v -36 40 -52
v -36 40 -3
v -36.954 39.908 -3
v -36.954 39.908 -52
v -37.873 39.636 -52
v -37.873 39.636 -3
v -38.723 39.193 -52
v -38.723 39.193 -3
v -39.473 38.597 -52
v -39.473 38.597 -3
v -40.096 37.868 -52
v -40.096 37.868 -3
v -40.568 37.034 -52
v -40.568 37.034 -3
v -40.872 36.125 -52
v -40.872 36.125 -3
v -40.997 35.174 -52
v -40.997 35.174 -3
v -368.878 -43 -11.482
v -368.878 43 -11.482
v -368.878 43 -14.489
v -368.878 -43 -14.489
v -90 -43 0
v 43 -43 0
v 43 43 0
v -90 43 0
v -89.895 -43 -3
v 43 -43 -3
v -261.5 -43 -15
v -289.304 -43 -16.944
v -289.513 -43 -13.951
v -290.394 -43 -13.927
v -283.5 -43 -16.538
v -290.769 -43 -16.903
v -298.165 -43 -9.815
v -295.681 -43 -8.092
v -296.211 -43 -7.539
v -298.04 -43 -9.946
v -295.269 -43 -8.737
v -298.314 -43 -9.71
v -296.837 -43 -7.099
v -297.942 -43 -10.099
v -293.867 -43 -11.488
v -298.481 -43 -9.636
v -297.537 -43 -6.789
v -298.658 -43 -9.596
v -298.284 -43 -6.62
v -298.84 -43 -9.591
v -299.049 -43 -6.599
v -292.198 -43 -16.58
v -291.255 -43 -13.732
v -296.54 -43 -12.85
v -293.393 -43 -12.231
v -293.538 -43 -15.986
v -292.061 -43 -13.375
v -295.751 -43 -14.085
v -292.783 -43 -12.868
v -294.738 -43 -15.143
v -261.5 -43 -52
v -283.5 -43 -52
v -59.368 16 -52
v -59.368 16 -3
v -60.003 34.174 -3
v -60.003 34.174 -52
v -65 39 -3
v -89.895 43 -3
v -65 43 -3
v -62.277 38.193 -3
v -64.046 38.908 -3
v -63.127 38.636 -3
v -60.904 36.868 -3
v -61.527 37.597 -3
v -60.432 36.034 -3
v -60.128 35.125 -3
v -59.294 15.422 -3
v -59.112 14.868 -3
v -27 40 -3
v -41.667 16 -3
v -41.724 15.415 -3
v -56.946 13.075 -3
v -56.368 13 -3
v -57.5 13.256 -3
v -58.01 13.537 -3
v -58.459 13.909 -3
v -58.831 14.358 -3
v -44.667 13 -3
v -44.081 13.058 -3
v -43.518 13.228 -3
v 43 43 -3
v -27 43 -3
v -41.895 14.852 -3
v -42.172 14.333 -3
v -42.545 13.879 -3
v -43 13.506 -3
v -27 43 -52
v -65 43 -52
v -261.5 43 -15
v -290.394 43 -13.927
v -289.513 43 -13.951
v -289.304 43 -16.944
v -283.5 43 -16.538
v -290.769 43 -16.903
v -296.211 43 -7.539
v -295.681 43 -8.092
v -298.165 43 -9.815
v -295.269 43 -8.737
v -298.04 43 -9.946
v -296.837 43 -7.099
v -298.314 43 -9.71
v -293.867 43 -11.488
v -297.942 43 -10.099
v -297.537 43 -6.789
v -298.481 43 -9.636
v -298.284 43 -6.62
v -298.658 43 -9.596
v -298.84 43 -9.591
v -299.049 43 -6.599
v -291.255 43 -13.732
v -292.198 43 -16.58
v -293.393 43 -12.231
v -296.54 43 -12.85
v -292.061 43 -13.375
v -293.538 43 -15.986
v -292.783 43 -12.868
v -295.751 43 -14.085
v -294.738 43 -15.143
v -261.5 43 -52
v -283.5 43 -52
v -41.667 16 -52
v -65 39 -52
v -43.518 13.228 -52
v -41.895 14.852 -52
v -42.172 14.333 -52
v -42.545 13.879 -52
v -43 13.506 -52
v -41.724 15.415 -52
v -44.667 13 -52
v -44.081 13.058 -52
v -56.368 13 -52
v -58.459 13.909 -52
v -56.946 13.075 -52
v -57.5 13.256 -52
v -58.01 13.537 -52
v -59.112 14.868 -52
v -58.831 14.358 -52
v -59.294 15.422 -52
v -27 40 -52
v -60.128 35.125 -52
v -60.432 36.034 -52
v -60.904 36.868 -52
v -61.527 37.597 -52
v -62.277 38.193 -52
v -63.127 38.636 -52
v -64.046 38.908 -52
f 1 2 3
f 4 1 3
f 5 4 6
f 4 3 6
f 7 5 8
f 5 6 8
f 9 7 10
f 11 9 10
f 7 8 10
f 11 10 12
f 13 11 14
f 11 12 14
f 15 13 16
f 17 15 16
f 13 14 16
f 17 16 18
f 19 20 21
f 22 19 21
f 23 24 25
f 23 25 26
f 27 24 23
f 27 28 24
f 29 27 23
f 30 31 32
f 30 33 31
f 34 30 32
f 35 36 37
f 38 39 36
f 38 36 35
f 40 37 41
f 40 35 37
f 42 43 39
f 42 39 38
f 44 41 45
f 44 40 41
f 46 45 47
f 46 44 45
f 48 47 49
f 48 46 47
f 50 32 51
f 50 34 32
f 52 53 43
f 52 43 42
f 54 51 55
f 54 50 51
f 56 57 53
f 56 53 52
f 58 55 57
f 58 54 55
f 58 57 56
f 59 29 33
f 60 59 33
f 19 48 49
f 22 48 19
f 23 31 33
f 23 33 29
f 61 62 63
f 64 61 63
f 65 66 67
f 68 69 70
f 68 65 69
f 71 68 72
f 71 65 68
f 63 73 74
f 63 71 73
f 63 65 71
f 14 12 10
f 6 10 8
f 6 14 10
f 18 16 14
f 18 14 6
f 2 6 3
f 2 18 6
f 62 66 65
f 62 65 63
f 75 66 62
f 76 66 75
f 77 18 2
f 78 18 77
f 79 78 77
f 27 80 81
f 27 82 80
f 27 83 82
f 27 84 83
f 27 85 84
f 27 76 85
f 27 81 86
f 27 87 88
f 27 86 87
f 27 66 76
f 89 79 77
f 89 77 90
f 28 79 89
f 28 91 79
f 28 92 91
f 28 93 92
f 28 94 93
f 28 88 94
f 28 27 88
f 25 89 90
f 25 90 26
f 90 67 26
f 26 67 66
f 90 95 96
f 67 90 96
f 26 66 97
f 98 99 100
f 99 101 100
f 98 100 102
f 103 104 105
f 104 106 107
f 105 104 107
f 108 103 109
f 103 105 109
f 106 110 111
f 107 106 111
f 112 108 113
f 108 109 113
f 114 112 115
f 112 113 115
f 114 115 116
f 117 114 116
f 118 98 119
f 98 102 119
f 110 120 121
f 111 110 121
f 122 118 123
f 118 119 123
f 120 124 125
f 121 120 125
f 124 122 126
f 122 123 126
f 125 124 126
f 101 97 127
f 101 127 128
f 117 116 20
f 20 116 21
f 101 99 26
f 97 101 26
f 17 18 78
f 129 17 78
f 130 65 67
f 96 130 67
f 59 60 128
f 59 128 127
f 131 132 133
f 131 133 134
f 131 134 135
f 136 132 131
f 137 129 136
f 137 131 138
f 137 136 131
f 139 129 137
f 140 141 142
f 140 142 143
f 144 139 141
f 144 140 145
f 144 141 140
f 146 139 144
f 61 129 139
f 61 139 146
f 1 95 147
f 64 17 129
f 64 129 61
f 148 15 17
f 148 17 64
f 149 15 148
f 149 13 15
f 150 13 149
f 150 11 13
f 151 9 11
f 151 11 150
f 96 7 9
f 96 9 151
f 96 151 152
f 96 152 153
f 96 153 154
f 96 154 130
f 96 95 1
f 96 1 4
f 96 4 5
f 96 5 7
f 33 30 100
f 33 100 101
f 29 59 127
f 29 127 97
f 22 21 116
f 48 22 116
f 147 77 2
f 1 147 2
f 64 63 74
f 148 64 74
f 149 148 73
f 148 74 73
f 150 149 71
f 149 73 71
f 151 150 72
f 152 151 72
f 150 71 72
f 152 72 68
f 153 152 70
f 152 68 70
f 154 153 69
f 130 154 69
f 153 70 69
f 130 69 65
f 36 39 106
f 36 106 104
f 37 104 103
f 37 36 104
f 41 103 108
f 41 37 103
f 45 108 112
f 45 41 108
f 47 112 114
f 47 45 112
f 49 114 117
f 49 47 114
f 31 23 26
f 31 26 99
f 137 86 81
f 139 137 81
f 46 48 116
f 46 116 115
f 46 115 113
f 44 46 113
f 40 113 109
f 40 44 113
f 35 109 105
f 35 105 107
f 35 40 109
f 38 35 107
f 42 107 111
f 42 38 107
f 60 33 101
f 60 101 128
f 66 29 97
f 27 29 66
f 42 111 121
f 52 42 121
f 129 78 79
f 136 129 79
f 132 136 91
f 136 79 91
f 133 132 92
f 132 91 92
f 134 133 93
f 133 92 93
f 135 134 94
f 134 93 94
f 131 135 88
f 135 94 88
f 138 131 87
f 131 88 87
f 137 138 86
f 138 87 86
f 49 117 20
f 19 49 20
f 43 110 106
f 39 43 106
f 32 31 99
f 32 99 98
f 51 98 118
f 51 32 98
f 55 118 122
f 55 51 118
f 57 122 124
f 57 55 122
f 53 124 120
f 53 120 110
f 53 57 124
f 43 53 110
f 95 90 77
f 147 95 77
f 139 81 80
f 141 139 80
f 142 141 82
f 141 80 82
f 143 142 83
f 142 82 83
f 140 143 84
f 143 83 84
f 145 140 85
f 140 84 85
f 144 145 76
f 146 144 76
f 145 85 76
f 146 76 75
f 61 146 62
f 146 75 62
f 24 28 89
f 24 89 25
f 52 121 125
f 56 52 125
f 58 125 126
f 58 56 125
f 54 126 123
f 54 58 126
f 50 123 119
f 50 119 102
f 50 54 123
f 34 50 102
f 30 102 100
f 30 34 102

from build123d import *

# Parameters (mm, degrees)
EXTRUSION1_DEPTH      = 43
EXTRUSION1_DEPTH_BACK = 43
EXTRUSION2_DEPTH      = 49


with BuildPart() as part:
    # Esquisse1 → Extrusion1 (new, two sides: drawn at the far end of the back side and taken through both)
    with BuildSketch(Plane(origin=(0, 0, 0), x_dir=(1, 0, 0), z_dir=(0, 1, 0)).offset(-EXTRUSION1_DEPTH_BACK)):
        with BuildLine():
            Line((43, 0), (-90, 0))
            Line((-90, 0), (-289.512810052, 13.951294749))
            ThreePointArc((-289.512810052, 13.951294749), (-292.060894193, 13.374722173), (-293.867473702, 11.487544597))
            Line((-293.867473702, 11.487544597), (-295.268797801, 8.737291199))
            ThreePointArc((-295.268797801, 8.737291199), (-296.837030139, 7.099094327), (-299.048938294, 6.59859061))
            Line((-299.048938294, 6.59859061), (-368.878421812, 11.481543773))
            Line((-368.878421812, 11.481543773), (-368.878421812, 14.488869467))
            Line((-368.878421812, 14.488869467), (-298.839668873, 9.591282761))
            ThreePointArc((-298.839668873, 9.591282761), (-298.314300819, 9.710161415), (-297.941817373, 10.099262699))
            Line((-297.941817373, 10.099262699), (-296.540493275, 12.849516097))
            ThreePointArc((-296.540493275, 12.849516097), (-293.538164873, 15.985789261), (-289.303540631, 16.9439869))
            Line((-289.303540631, 16.9439869), (-283.5, 16.538163805))
            Line((-283.5, 16.538163805), (-283.5, 52))
            Line((-283.5, 52), (-261.5, 52))
            Line((-261.5, 52), (-261.5, 14.999773943))
            Line((-261.5, 14.999773943), (-89.895237692, 3))
            Line((-89.895237692, 3), (43, 3))
            Line((43, 3), (43, 0))
        make_face()
    extrude(amount=EXTRUSION1_DEPTH + EXTRUSION1_DEPTH_BACK)

    # Esquisse2 → Extrusion2 (add)
    with BuildSketch(Plane(origin=(0, 0, -3), x_dir=(-1, 0, 0), z_dir=(0, 0, -1))):
        with BuildLine():
            Line((27, 43), (27, 40))
            Line((27, 40), (36, 40))
            ThreePointArc((36, 40), (39.473291852, 38.596699002), (40.996954135, 35.174497484))
            Line((40.996954135, 35.174497484), (41.666542342, 16))
            ThreePointArc((41.666542342, 16), (42.545221998, 13.878679656), (44.666542342, 13))
            Line((44.666542342, 13), (56.368378428, 13))
            ThreePointArc((56.368378428, 13), (58.459244141, 13.909134287), (59.368378428, 16))
            Line((59.368378428, 16), (60.003045865, 34.174497484))
            ThreePointArc((60.003045865, 34.174497484), (61.526708148, 37.596699002), (65, 39))
            Line((65, 39), (65, 43))
            Line((65, 43), (27, 43))
        make_face()
    extrude(amount=EXTRUSION2_DEPTH)


solid = part.part
